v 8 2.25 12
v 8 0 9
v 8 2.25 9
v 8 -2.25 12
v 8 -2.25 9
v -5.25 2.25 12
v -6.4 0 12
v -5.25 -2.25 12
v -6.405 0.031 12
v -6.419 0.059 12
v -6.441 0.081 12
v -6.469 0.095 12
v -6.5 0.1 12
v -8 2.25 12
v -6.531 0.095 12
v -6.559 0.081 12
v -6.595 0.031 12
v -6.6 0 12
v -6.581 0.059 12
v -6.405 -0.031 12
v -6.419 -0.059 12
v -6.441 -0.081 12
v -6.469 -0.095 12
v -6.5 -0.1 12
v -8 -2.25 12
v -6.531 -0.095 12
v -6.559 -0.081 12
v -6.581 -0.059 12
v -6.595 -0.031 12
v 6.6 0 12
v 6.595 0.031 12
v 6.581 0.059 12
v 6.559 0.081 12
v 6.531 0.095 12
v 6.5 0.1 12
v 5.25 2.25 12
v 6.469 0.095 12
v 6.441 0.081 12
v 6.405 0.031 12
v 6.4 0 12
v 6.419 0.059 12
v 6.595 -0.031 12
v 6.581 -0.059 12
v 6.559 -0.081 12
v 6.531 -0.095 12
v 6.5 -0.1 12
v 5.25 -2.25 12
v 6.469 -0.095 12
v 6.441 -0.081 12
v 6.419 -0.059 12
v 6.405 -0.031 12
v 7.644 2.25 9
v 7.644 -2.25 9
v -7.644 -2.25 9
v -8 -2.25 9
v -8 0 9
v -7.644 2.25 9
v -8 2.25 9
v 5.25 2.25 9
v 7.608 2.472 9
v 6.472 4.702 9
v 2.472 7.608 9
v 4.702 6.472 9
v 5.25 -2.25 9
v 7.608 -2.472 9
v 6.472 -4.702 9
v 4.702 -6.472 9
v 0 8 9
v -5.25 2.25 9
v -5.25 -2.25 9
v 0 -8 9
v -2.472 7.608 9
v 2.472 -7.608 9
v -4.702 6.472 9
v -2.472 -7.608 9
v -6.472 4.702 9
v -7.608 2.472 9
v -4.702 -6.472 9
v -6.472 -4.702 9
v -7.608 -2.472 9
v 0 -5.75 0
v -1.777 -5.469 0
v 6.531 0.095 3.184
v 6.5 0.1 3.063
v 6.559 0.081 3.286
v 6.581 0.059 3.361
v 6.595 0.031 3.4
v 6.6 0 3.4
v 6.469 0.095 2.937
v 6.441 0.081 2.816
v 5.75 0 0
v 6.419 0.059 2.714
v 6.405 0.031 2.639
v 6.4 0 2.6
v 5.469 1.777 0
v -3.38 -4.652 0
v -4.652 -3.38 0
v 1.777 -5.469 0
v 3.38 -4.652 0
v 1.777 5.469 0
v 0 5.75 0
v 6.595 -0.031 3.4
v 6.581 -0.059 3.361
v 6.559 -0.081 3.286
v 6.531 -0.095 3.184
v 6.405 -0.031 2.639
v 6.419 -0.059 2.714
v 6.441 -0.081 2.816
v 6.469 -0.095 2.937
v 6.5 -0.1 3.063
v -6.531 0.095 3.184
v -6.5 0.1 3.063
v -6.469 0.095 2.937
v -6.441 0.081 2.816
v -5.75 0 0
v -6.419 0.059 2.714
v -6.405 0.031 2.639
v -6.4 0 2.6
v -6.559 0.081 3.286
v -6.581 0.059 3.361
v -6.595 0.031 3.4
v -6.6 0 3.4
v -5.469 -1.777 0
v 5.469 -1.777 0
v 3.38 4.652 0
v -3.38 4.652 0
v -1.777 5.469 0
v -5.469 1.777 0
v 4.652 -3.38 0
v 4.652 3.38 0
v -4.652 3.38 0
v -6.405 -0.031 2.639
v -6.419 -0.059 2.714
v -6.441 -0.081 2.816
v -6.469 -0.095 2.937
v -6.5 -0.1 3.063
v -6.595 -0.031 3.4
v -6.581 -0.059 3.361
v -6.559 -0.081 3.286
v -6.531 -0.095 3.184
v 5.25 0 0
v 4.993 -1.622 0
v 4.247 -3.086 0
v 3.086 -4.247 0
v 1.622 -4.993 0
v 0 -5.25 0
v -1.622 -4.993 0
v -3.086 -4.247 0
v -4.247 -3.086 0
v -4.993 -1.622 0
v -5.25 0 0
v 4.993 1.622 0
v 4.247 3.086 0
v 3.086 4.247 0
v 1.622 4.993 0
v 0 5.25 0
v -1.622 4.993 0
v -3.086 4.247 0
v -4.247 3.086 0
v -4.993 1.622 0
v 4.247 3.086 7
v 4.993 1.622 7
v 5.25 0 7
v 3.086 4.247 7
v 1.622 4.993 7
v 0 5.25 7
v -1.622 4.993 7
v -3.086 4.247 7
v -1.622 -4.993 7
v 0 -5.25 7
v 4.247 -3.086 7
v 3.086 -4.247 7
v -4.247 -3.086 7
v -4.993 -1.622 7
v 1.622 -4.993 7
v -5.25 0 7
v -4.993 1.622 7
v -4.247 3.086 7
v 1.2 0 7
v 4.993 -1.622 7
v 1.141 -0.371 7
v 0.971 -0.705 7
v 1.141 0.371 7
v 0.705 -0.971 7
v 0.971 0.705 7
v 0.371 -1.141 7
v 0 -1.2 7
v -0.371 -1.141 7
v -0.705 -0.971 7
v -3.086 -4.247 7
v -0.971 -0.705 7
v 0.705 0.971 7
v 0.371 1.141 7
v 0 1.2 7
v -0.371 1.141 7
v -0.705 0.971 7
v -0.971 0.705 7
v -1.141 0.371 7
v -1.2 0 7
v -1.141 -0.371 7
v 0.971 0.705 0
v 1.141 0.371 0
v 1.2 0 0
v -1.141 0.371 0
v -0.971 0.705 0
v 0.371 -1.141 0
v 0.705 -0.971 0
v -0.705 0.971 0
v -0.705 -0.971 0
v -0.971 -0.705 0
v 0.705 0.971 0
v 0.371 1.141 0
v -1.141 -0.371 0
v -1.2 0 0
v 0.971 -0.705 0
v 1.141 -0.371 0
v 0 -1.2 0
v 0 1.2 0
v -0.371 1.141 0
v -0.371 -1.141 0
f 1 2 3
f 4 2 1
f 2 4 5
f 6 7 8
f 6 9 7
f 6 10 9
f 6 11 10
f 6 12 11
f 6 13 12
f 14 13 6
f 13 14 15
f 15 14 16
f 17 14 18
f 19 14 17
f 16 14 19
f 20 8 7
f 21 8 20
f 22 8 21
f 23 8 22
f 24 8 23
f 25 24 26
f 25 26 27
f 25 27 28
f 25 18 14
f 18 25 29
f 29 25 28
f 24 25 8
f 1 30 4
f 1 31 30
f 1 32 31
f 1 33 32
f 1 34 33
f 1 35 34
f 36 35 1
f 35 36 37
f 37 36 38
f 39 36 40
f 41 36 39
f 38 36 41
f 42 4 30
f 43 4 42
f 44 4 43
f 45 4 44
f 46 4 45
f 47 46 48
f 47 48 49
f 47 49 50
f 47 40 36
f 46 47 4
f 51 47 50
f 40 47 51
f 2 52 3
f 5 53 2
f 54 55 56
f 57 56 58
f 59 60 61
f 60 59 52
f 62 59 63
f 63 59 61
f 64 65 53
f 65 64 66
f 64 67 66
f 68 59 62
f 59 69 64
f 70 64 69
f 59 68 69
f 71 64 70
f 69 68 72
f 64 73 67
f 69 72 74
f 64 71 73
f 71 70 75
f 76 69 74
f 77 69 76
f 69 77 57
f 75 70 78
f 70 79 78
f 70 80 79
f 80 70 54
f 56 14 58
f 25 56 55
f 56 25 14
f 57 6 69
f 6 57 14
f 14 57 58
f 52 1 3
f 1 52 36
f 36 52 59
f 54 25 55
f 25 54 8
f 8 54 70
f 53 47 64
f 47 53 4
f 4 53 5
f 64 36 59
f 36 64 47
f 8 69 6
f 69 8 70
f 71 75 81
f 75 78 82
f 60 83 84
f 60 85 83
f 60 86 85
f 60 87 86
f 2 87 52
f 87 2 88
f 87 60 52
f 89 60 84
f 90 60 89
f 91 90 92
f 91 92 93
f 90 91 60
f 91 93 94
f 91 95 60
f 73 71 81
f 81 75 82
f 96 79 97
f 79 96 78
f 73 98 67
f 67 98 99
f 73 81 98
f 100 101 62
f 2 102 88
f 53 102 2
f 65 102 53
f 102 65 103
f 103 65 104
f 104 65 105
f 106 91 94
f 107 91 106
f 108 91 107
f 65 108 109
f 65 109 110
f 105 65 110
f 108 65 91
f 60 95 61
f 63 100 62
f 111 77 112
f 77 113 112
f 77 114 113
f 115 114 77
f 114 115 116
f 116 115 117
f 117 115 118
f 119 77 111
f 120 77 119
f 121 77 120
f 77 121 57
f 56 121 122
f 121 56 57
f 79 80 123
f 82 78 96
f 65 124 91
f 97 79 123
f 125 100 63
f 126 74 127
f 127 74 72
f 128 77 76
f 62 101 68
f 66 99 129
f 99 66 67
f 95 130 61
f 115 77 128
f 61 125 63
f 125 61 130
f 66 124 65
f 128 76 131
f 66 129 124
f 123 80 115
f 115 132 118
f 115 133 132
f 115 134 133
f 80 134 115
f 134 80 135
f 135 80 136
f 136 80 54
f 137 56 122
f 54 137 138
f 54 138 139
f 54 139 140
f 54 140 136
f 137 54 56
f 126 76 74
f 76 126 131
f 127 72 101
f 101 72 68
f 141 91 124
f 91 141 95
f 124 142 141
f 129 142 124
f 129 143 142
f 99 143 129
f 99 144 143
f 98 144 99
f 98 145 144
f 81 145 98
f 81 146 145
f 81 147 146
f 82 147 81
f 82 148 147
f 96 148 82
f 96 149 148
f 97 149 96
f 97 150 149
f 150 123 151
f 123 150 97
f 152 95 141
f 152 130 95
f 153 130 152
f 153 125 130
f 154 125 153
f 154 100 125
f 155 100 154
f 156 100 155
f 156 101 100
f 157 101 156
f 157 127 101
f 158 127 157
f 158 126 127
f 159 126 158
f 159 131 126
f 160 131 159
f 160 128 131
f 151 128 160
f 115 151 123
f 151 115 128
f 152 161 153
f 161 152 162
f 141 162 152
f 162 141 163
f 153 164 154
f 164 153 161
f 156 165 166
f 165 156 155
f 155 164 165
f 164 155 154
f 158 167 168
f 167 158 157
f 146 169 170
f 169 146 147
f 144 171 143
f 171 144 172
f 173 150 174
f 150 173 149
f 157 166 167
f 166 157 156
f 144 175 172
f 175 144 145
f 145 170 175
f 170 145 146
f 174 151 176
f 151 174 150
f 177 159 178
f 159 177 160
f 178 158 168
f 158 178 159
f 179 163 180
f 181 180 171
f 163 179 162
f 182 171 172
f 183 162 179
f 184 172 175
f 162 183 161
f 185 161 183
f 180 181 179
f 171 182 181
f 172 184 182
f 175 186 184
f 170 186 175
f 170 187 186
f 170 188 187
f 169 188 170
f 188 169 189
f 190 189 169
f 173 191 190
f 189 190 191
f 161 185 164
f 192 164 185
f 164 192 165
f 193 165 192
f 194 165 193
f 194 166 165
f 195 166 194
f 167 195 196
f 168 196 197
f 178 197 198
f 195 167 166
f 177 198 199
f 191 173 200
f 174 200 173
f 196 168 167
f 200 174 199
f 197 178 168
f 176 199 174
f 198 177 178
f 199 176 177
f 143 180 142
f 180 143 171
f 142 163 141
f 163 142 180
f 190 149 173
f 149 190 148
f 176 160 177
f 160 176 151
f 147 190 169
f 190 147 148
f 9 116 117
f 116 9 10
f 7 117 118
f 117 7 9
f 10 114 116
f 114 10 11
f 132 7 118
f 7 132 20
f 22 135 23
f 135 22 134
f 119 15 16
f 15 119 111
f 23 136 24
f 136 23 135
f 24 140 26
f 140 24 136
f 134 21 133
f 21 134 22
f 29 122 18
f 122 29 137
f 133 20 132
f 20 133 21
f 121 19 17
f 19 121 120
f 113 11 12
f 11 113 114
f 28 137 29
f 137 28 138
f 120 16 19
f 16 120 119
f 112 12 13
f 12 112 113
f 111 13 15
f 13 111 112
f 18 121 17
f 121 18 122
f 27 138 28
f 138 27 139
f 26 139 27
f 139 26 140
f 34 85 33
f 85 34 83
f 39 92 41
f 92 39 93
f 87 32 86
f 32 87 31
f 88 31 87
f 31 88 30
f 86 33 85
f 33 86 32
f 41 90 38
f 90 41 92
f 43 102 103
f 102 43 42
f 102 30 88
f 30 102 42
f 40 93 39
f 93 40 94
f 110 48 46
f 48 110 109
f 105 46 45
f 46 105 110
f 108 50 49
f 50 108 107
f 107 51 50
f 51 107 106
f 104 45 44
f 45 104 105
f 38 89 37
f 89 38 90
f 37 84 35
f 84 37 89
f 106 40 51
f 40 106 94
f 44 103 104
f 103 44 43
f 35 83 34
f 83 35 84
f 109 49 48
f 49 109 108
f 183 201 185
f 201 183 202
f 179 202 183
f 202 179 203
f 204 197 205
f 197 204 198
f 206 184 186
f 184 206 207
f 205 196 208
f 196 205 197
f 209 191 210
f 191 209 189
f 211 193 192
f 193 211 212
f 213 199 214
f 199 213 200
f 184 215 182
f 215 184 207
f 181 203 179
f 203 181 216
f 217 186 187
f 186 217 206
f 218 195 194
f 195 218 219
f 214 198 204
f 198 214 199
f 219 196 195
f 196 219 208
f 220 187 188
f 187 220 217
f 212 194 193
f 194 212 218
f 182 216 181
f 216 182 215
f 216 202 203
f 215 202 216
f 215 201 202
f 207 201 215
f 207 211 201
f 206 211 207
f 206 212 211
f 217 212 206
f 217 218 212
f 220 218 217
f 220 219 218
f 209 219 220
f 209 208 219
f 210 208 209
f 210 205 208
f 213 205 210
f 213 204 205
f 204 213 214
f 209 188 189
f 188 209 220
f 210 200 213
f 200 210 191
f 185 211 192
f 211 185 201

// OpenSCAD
// file: joystick_4_way_hat_mk1.scad
/*
	OpenJoystick - A project creating affordable, open source, 3D-printable custom flight-sim joysticks for everyone
	Copyright (C) 2012 Travis John Howse

	This program is free software: you can redistribute it and/or modify
	it under the terms of the GNU General Public License as published by
	the Free Software Foundation, either version 3 of the License, or
	(at your option) any later version.

	This program is distributed in the hope that it will be useful,
	but WITHOUT ANY WARRANTY; without even the implied warranty of
	MERCHANTABILITY or FITNESS FOR A PARTICULAR PURPOSE.  See the
	GNU General Public License for more details.

	You should have received a copy of the GNU General Public License
	along with this program.  If not, see <http://www.gnu.org/licenses/>.
*/

include <joystick_defines.scad>

// See joystick_defines for most of the guts.

//translate([0,0,10])
//	4_way_hat_washer();
//translate([0,0,13])
//	switch_hat_saddle();
//  switch_hat_hanoi();
//pb(1);

module hat_base(numDirs)
{
	difference()
	{
		cylinder(r=(4_way_hat_base_dia/2), h=4_way_hat_base_z, $fn=circle_faces);
		
		translate([0,pb_total_z+(4_way_hat_base_screw_dia/2),4_way_hat_base_z-pb_xy/2+zff])
			rotate([90,0,0])
				pb(1.02,0);
		translate([0,-pb_total_z-(4_way_hat_base_screw_dia/2),4_way_hat_base_z-pb_xy/2+zff])
			rotate([-90,180,0])
				pb(1.02,0);
		if (numDirs==4)
		{
			translate([pb_total_z+(4_way_hat_base_screw_dia/2),0,4_way_hat_base_z-pb_xy/2+zff])
				rotate([90,0,-90])
					pb(1.02,0);
			translate([-pb_total_z-(4_way_hat_base_screw_dia/2),0,4_way_hat_base_z-pb_xy/2+zff])
				rotate([-90,180,-90])
					pb(1.02,0);
//			// Now chop the bit out of the middle
			translate([0,0,4_way_hat_base_base_z+zff])
				//cube([4_way_hat_base_screw_dia+2*pb_btn_z+zff,4_way_hat_base_screw_dia+2*pb_btn_z+zff,10],center=true);
                cylinder(r=sqrt(pow((pb_btn_dia/2),2) + pow((4_way_hat_base_screw_dia/2+pb_btn_z),2)),h=10,$fn=circle_faces);
		} else	{
			// Now chop the bit out of the middle
			translate([0,0,4_way_hat_base_base_z+5])
				cube([4_way_hat_base_screw_dia,4_way_hat_base_screw_dia+2*pb_btn_z+zff,10],center=true);
		}

		// Now chop the bit out of the middle
		/*translate([0,0,4_way_hat_base_base_z+5])
			cube([pb_xy+zff,pb_xy+zff,10],center=true);*/

		// Screw
		translate([0,0,-1])
            union()
            {
                rotate([0,5,0]) cylinder(r=4_way_hat_base_screw_dia/2, h=4_way_hat_base_z*1, $fn=circle_faces);
                rotate([0,-5,0]) cylinder(r=4_way_hat_base_screw_dia/2, h=4_way_hat_base_z*1, $fn=circle_faces);
                rotate([5,0,0]) cylinder(r=4_way_hat_base_screw_dia/2, h=4_way_hat_base_z*1, $fn=circle_faces);
                rotate([-5,0,0]) cylinder(r=4_way_hat_base_screw_dia/2, h=4_way_hat_base_z*1, $fn=circle_faces);
                cylinder(r=4_way_hat_base_screw_dia/2, h=4_way_hat_base_z*1, $fn=circle_faces);
            }
	}		
}

module hat_voids(numDirs)
{
	difference()
	{
		cylinder(r=4_way_hat_base_dia/2, h=4_way_hat_base_z);		
		hat_base(numDirs);
	}
}

module switch_hat_saddle()
{
	step_size = 2; // Won't really work for anything other than 2, sorry.
	num_steps = 4_way_hat_base_dia / step_size;
	switch_hat_saddle_base_depth = 4;


	union()
	{
		translate([0,0,switch_hat_saddle_base_depth])
			intersection()
			{
				cylinder(r = (4_way_hat_base_dia/2), h = 10, $fn=circle_faces);
				for (n = [0:num_steps])
				{
					translate([-(4_way_hat_base_dia/2)+n*step_size+0.25*step_size,0,0])
						cube([step_size, 4_way_hat_base_dia, abs((num_steps/2)-n)*1.5],center=true);
				}
			}
		difference()
		{
			cylinder(r = (4_way_hat_base_dia/2), h = switch_hat_saddle_base_depth, $fn=circle_faces);
			translate([0,0,-zff])
				cylinder(r=(4_way_hat_base_screw_dia/2), h =switch_hat_saddle_base_depth, $fn=circle_faces);
		}
	}
}

module switch_hat_hanoi()
{
	
	difference()
	{
		union()
		{
			cylinder(r = (4_way_hat_base_dia/2), h = 2, $fn=circle_faces);
			translate([0,0,2])
			{
				for (n = [1:8])
				{
					cylinder(r = (4_way_hat_base_dia/2 - (n-1)), h = n*0.7, $fn=circle_faces);
				}
			}
		}
		translate([0,0,-zff])
			cylinder(r=(4_way_hat_base_screw_dia/2), h = 4, $fn=circle_faces);
	}	
}

module 4_way_hat_washer()
{
	difference()
	{
		cylinder(r=(4_way_hat_base_dia/2), h = 1, $fn=circle_faces);
		translate([0,0,-zff])
			cylinder(r=(4_way_hat_base_screw_dia/2), h = 1+2*zff, $fn=circle_faces);
	}
}

module hat_stem(height)
{
	bolt(8.5/2, 1.5, 4.5/2, height,0);
}
	
//hat_stem(11); // Face hats
hat_stem(23); // CMS
//switch_hat_hanoi();
// file: joystick_defines.scad
/*
	OpenJoystick - A project creating affordable, open source, 3D-printable custom flight-sim joysticks for everyone
	Copyright (C) 2012 Travis John Howse

	This program is free software: you can redistribute it and/or modify
	it under the terms of the GNU General Public License as published by
	the Free Software Foundation, either version 3 of the License, or
	(at your option) any later version.

	This program is distributed in the hope that it will be useful,
	but WITHOUT ANY WARRANTY; without even the implied warranty of
	MERCHANTABILITY or FITNESS FOR A PARTICULAR PURPOSE.  See the
	GNU General Public License for more details.

	You should have received a copy of the GNU General Public License
	along with this program.  If not, see <http://www.gnu.org/licenses/>.
*/

// Standard skate bearing
bearing_inside_dia = 8;
bearing_outside_dia = 22;
bearing_thickness = 7;

// Arbitrary value
shaft_dia = 16;

zff = 0.005;

extrusion_width = 0.8; // Used for single-wall support.

// Set this to 1 to translate everything to printable mode
printable_mode = 0;

// Gimbal core block sizes 
gimbal_core_x = 50;
gimbal_core_y = 30;
gimbal_core_z = gimbal_core_y;

// Gimbal frame sizes 
gimbal_frame_thickness = 10; 

circle_faces = 20;
$fn=circle_faces;

// The 1.8 is 2sin(45)ish, the maximum y on the xy plane the core can occupy
gimbal_frame_x = gimbal_core_x+2*gimbal_frame_thickness+2; // 2mm for washers
gimbal_frame_y = (gimbal_core_y * 1.8)+gimbal_frame_thickness;

// Frame is big enough to stop the core colliding at 45 degree rotation.
gimbal_frame_z = sqrt(pow(gimbal_core_z,2)/2) * 2 + 2; // 2 fudge to allow for clearance at tips.

max_angle = 45; // Not much comes off this, should probably build it in more places.

module bearing(hole,outer_puff)
{
	difference()
	{
		cylinder(h=bearing_thickness, r = (bearing_outside_dia/2)+outer_puff);

		if (hole)
		{
			translate([0,0,-zff])
				cylinder(h=9, r = (bearing_inside_dia/2));
		}
	}
}

// Hat sizes
// Note that many other settings for the hats are in their own .scad, only stuff relevant to the rest of the stick is here.
pb_xy = 6;
pb_z = 4; // Height minus pushbutton
pb_btn_z = 1;
pb_total_z = pb_z+pb_btn_z;
pb_btn_dia = 3.5;
pb_leg_x = 4;
pb_leg_y = 5;
pb_leg_z = 0.7;

lever_switch_x = 12.85;
lever_switch_y = 6.5;
lever_switch_z = 5.8;

4_way_hat_base_dia = 18;
4_way_hat_base_base_z = 1.5; // Base thickness
4_way_hat_base_z = pb_xy + 4_way_hat_base_base_z;
4_way_hat_base_screw_dia = 5;
4_way_hat_base_screw_head_dia = 8.25;
4_way_hat_base_screw_head_thk = 3;
4_way_hat_wire_gap = 3;
4_way_hat_cutout_z = 4_way_hat_base_z + 4_way_hat_base_screw_head_thk;

// Grip sizes
grip_height = 100;
grip_diameter = 44;
grip_clip = 33;
grip_rest_thickness = 5;
grip_rest_diameter = 80;
grip_cms_height_offset = 50;
grip_cms_offset = -5;
grip_cms_angle = 30;
grip_cms_stub_length = 40;
grip_cms_stub_diameter = 4_way_hat_base_dia;
grip_cms_twist = 15;

grip_head_offset_x = -10;
grip_head_box_x = 4_way_hat_base_dia * 2.5;
grip_head_box_y = 4_way_hat_base_dia * 2.2;
grip_head_box_z = 4_way_hat_base_dia * 2;

joystick_head_trigger_thickness = pb_xy;

my_layer_thickness = 0.35;

joystick_big_btn_height = 8;
joystick_big_btn_diameter = 8.0;
joystick_big_btn_clippyness = 3;

headbolt_x = 10.8;
headbolt_y = -9;
headbolt_z = -11;
headbolt_extra = 8;

module hat_cutout(bloat)
{
	// Very similar to a hat, but it has a cross on the bottom and a peg to indicate where the cables will be run.
	translate([0,0,-4_way_hat_wire_gap-4_way_hat_base_z])
	union()
	{
		translate([0,0,4_way_hat_wire_gap])cylinder(r=(4_way_hat_base_dia/2)*bloat,h=4_way_hat_base_z);
		
		intersection()
		{
			cylinder(r=(4_way_hat_base_dia/2)*bloat,h=4_way_hat_base_z);
			union()
			{
				cube([100, pb_xy, 10],true);
				cube([pb_xy, 100, 10],true);
			}
		}
		translate([0,0,-4_way_hat_base_screw_head_thk+4_way_hat_wire_gap]) cylinder(r=(4_way_hat_base_screw_head_dia/2),h=4_way_hat_base_screw_head_thk,$fn=circle_faces);
	}
}

module pb(puff, legdir)
{
	translate([0,0,pb_z/2])
	{
		// Puff set to 1 if you want a realistic model of a button.
		// Puff variable used for making holes in things bigger than the button size
		cube([pb_xy*puff,pb_xy*puff,pb_z*puff],center=true);
	
		// Button knob itself
		translate([0,0,pb_z/2-zff])
			cylinder(r=(pb_btn_dia/2),h=pb_btn_z,$fn=circle_faces);
	
		// Button legs
		if (legdir == 0)
		{
			translate([0,-pb_xy/2-pb_leg_y/2+zff,-pb_z/2+pb_leg_z/2+0.8])
				cube([pb_xy,pb_leg_y,pb_leg_z],center=true);
		} else {
			translate([0,-pb_xy/2+pb_leg_z/2+zff-pb_leg_z,-pb_z/2-pb_leg_y/2+0.8])
				cube([pb_xy,pb_leg_z,pb_leg_y],center=true);
		}
	}

}

module bolt(cap_r, cap_z, shaft_r, shaft_z,slot_len)
{
	// Hex head bolt for holding head together
	cylinder(r=cap_r,h=cap_z);
	translate([0,0,cap_z]) cylinder(r=shaft_r+0.15, h=slot_len);
	translate([0,0,cap_z+slot_len]) cylinder(r=shaft_r, h=shaft_z-slot_len);
}

module fillet(radius, length)
{
	difference()
	{
		cube([radius,length,radius]);
		translate([radius,length+zff,radius]) rotate([90,0,0]) cylinder(r=radius,h=length+2*zff);
	}
}
// main file
/*
	OpenJoystick - A project creating affordable, open source, 3D-printable custom flight-sim joysticks for everyone
	Copyright (C) 2012 Travis John Howse

	This program is free software: you can redistribute it and/or modify
	it under the terms of the GNU General Public License as published by
	the Free Software Foundation, either version 3 of the License, or
	(at your option) any later version.

	This program is distributed in the hope that it will be useful,
	but WITHOUT ANY WARRANTY; without even the implied warranty of
	MERCHANTABILITY or FITNESS FOR A PARTICULAR PURPOSE.  See the
	GNU General Public License for more details.

	You should have received a copy of the GNU General Public License
	along with this program.  If not, see <http://www.gnu.org/licenses/>.
*/

include <joystick_defines.scad>
use <joystick_handle.scad>
bearing_retain_thickness = 1;

inner_gimbal_x = 58;
inner_gimbal_y = 35;
inner_gimbal_z = 25;

inner_gimbal_total_x = inner_gimbal_x+2*bearing_retain_thickness;
inner_gimbal_total_y = inner_gimbal_y+2*bearing_retain_thickness;

joiner_z = 10;
joiner_x = 10;
joiner_stem_scalar = 4;
support_stem_beef = 1;

temp = joiner_z/2;

springbar_offset = 2;
springbar_y = 20;
springbar_z = 5;
springbar_x = 8;
springbar_separation = springbar_y -8;

// Solidified this variable for consistent springiness
//springsupport_separation = inner_gimbal_total_x-5;
springsupport_separation = 47;
//echo(springsupport_separation);

joiner_peg_z = 5;
joiner_peg_xy = bearing_inside_dia / sqrt(2);

base_support_height = 25;
inner_gimbal_clearance = 2;

magnet_d = 10;
magnet_z = 5;

// A little bit of extra clearance on the springbar to allow for clearance of the bolts internally.
// on the inner gimbal.
// Might abandon this if the bolts/spring cause magnetic annoyances.
springbar_extra = 2;

module joystick_joiner()
{
	total_y = inner_gimbal_y+2*bearing_retain_thickness-2*bearing_thickness;
	bolt_offset = 21.5;
	
	difference()
	{
		union()
		{
			scale([1,1,joiner_stem_scalar]) joystick_handle_peg(0);
			translate([-joiner_x/2,-total_y/2,0]) cube([joiner_x,total_y,joiner_z]);
		}
		//translate([0,total_y/2+zff,joiner_z/2]) rotate([-90,0,0]) %bearing(1);
		//translate([0,-total_y/2-zff-bearing_thickness,joiner_z/2]) rotate([-90,0,0]) %bearing(1);
		
		translate([-joiner_peg_xy/2,total_y/2-joiner_peg_z+zff,joiner_z/2-joiner_peg_xy/2]) cube([joiner_peg_xy,joiner_peg_z,joiner_peg_xy]);
		translate([-joiner_peg_xy/2,-(total_y/2+zff),joiner_z/2-joiner_peg_xy/2]) cube([joiner_peg_xy,joiner_peg_z,joiner_peg_xy]);
		
		//translate([0,-total_y/2-zff-bearing_thickness,joiner_z/2]) rotate([-90,0,0]) #cube([joiner_peg_xy,joiner_peg_z,joiner_peg_xy]);
		
		
		rotate([90,0,0]) translate([0,joiner_z/2,-bolt_offset]) bolt(3,3,1.45,20,0);
		rotate([-90,0,0]) translate([0,-joiner_z/2,-bolt_offset]) bolt(3,3,1.45,20,0);
		
		rotate([-90,0,0]) translate([0,-20,-12]) bolt(3,3,1.45,20,0);
		rotate([-90,0,0]) translate([0,-30,-12]) bolt(3,3,1.45,20,0);
		rotate([-90,0,0]) translate([0,-40,-12]) bolt(3,3,1.45,20,0);
		rotate([-90,0,0]) translate([0,-50,-12]) bolt(3,3,1.45,20,0);
	}
	
}

module joystick_inner_gimbal()
{
	extra_height_on_screwholes = 1;
	difference()
	{
		union()
		{
			difference()
			{
				translate([-inner_gimbal_total_x/2, -inner_gimbal_total_y/2, -inner_gimbal_z/2])
					cube([inner_gimbal_total_x, inner_gimbal_total_y, inner_gimbal_z]);
				translate([-inner_gimbal_x/2+bearing_thickness, -inner_gimbal_y/2+bearing_thickness, -inner_gimbal_z/2-zff])
					cube([inner_gimbal_x-2*bearing_thickness, inner_gimbal_y-2*bearing_thickness, inner_gimbal_z+2*zff]);

				translate([0,inner_gimbal_total_y/2-bearing_thickness+zff,0]) rotate([-90,0,0]) bearing(0,0.1);
				
				translate([0,-inner_gimbal_total_y/2-zff,0]) rotate([-90,0,0]) bearing(0,0.1);
				rotate([90,0,0]) translate([0,0,-inner_gimbal_y/2]) cylinder(r=(bearing_outside_dia-4)/2,h=inner_gimbal_y);
				
				translate([inner_gimbal_total_x/2+zff,0,0]) rotate([0,-90,0]) bearing(0,0.1);
				translate([-inner_gimbal_total_x/2+bearing_thickness-zff,0,0]) rotate([0,-90,0]) bearing(0,0.1);
				rotate([0,90,0]) translate([0,0,-inner_gimbal_x/2]) cylinder(r=(bearing_outside_dia-4)/2,h=inner_gimbal_x);		 
			}
			//cueb!
			
			// Spring support stems
			translate([0,0,springbar_offset]) union()
			{
				translate([springsupport_separation/2-2.5, -inner_gimbal_total_y/2-5, -2.5]) cube([5,springbar_z,5]);
				translate([-springsupport_separation/2-2.5, -inner_gimbal_total_y/2-5, -2.5]) cube([5,springbar_z,5]);
				translate([springsupport_separation/2-2.5, -inner_gimbal_total_y/2-5, -2.5]) rotate([-45,0,0]) cube([5,springbar_z*sqrt(2),5]);
				translate([-springsupport_separation/2-2.5, -inner_gimbal_total_y/2-5, -2.5]) rotate([-45,0,0]) cube([5,springbar_z*sqrt(2),5]);
			
				translate([inner_gimbal_total_x/2, springsupport_separation/2-2.5, -2.5]) cube([springbar_z,5,5+extra_height_on_screwholes]);	
				translate([inner_gimbal_total_x/2, springsupport_separation/2-2.5, -7.5]) rotate([0,-45,0]) cube([springbar_z*sqrt(2),5,5]);
				
				translate([inner_gimbal_total_x/2, -springsupport_separation/2-2.5, -2.5]) cube([springbar_z,5,5+extra_height_on_screwholes]);				
				translate([inner_gimbal_total_x/2, -springsupport_separation/2-2.5, -7.5]) rotate([0,-45,0]) cube([springbar_z*sqrt(2),5,5]);
			}
			translate([inner_gimbal_total_x/2-(inner_gimbal_total_x-springsupport_separation)/2+2.5, -springsupport_separation/2-2.5, -inner_gimbal_z/2])
				cube([(inner_gimbal_total_x-springsupport_separation)/2-2.5,(springsupport_separation-inner_gimbal_total_y)/2+2.5,springbar_offset+inner_gimbal_z/2+2.5+extra_height_on_screwholes]);

			translate([inner_gimbal_total_x/2-(inner_gimbal_total_x-springsupport_separation)/2+2.5, springsupport_separation/2-5, -inner_gimbal_z/2])
				cube([(inner_gimbal_total_x-springsupport_separation)/2-2.5,(springsupport_separation-inner_gimbal_total_y)/2+2.5,springbar_offset+inner_gimbal_z/2+2.5+extra_height_on_screwholes]);

		}
		translate([0,0,springbar_offset]) union()
		{
			translate([springsupport_separation/2, -inner_gimbal_total_y/2-16.5, 0]) rotate([-90,0,0]) bolt(3,3,1.45,20,0);
			translate([-springsupport_separation/2, -inner_gimbal_total_y/2-16.5, 0]) rotate([-90,0,0]) bolt(3,3,1.45,20,0);

		}
		translate([0,0,springbar_offset]) union()
		{
			translate([inner_gimbal_total_x/2+20,springsupport_separation/2, 0]) rotate([0,-90,0]) bolt(3,3,1.45,20,0);
			translate([inner_gimbal_total_x/2+20,-springsupport_separation/2, 0]) rotate([0,-90,0]) bolt(3,3,1.45,20,0);

		}
		// Y-axis centering pegs
		// Note: using the springbar dimensions to ensure the same springiness between X and Y.
		
	}
	//cube([springsupport_separation,100,100],true);
}

module joystick_base()
{
	mounting_extra_y = 20;
	spar_width = joiner_x;
	
	base_x = inner_gimbal_total_x - bearing_thickness*2 - bearing_retain_thickness*2-inner_gimbal_clearance;
	base_y = inner_gimbal_total_y + mounting_extra_y;
	base_z = 5;
	
	fillet_radius = 5;
	
	ttx = spar_width/2-2;

	difference()
	{
		union()
		{
			translate([base_x/2-spar_width,-base_y/2,0]) cube([spar_width,base_y,base_z]);
			translate([-base_x/2,-base_y/2,0]) cube([spar_width,base_y,base_z]);
			
			translate([-(base_x+2*spar_width)/2,-spar_width/2,0]) cube([base_x+2*spar_width,spar_width,base_z]);
			
			translate([-base_x/2,-spar_width/2-support_stem_beef/2,base_z]) 
				difference()
				{
					union()
					{
						cube([spar_width,spar_width+support_stem_beef, base_support_height+support_stem_beef]);
						rotate([0,0,-90]) fillet(fillet_radius,spar_width);
						translate([spar_width,spar_width+support_stem_beef,0]) rotate([0,0,90]) fillet(fillet_radius,spar_width);
						translate([0,spar_width+support_stem_beef/2,0]) rotate([0,0,180]) fillet(fillet_radius,spar_width);
					}
					translate([-zff,spar_width/2-joiner_peg_xy/2+support_stem_beef/2,base_support_height-joiner_peg_xy-(spar_width-joiner_peg_xy)/2]) 
					union()
					{
						cube([joiner_peg_z,joiner_peg_xy, joiner_peg_xy]);
						translate([-spar_width,joiner_peg_xy/2,joiner_peg_xy/2]) rotate([0,90,0]) bolt(3,3,1.45,20,0);
					}
				}
			
			translate([base_x/2-spar_width,-spar_width/2-support_stem_beef/2,base_z])
				difference()
				{
					union()
					{
						cube([spar_width,spar_width+support_stem_beef, base_support_height+support_stem_beef]);
						rotate([0,0,-90]) fillet(fillet_radius,spar_width);
						translate([spar_width,spar_width+support_stem_beef,0]) rotate([0,0,90]) fillet(fillet_radius,spar_width);
						translate([spar_width,support_stem_beef/2,0]) rotate([0,0,0]) fillet(fillet_radius,spar_width);
					}
					translate([spar_width/2+zff,spar_width/2-joiner_peg_xy/2+support_stem_beef/2,base_support_height-joiner_peg_xy-(spar_width-joiner_peg_xy)/2]) 
					union()
					{
						cube([joiner_peg_z,joiner_peg_xy, joiner_peg_xy]);
						translate([spar_width,joiner_peg_xy/2,joiner_peg_xy/2]) rotate([0,-90,0]) bolt(3,3,1.45,20,0);
					}
					
				}
		}
		
		// Mounting bolts
		translate([base_x/2-spar_width/2,-base_y/2+5,10]) rotate([180,0,0]) bolt(3,3,1.45,20,0);
		translate([base_x/2-spar_width/2,base_y/2-5,10]) rotate([180,0,0]) bolt(3,3,1.45,20,0);
		translate([-base_x/2+spar_width/2,-base_y/2+5,10]) rotate([180,0,0]) bolt(3,3,1.45,20,0);
		translate([-base_x/2+spar_width/2,base_y/2-5,10]) rotate([180,0,0]) bolt(3,3,1.45,20,0);
		translate([(base_x+2*spar_width)/2-3,0,10]) rotate([180,0,0]) bolt(3,3,1.45,20,0);
		translate([-(base_x+2*spar_width)/2+3,0,10]) rotate([180,0,0]) bolt(3,3,1.45,20,0);
		
		
		// One day you'll be able to flag primatives for more infill.
		// Until then, horrible hacks:
		translate([spar_width/2+support_stem_beef/2-base_x/2,0,-1]) cylinder(r=0.1,h = 100);
		translate([spar_width/2+support_stem_beef/2-base_x/2+ttx,ttx,-1]) cylinder(r=0.1,h = 100);
		translate([spar_width/2+support_stem_beef/2-base_x/2+ttx,-ttx,-1]) cylinder(r=0.1,h = 100);
		translate([spar_width/2+support_stem_beef/2-base_x/2-ttx,ttx,-1]) cylinder(r=0.1,h = 100);
		translate([spar_width/2+support_stem_beef/2-base_x/2-ttx,-ttx,-1]) cylinder(r=0.1,h = 100);	
		
		translate([-spar_width/2-support_stem_beef/2+base_x/2,0,-1]) cylinder(r=0.1,h = 100);
		translate([-spar_width/2-support_stem_beef/2+base_x/2+ttx,ttx,-1]) cylinder(r=0.1,h = 100);
		translate([-spar_width/2-support_stem_beef/2+base_x/2+ttx,-ttx,-1]) cylinder(r=0.1,h = 100);
		translate([-spar_width/2-support_stem_beef/2+base_x/2-ttx,ttx,-1]) cylinder(r=0.1,h = 100);
		translate([-spar_width/2-support_stem_beef/2+base_x/2-ttx,-ttx,-1]) cylinder(r=0.1,h = 100);
	}
	
}

module joystick_stem_plug(lip_size, extrapeg)
{	
	
	difference()
	{
		union()
		{
			translate([0,0,lip_size]) cylinder(r=bearing_inside_dia/2-0.05,h=bearing_thickness);
			cylinder(r=bearing_inside_dia/2+1,h=lip_size);
			rotate([0,0,90]) translate([-(joiner_peg_xy)/2,-(joiner_peg_xy)/2, bearing_thickness+lip_size]) cube([(joiner_peg_xy),(joiner_peg_xy),joiner_peg_z+extrapeg]);
		}
		translate([0,0,-zff]) bolt(3,3,1.45,20,0);
	}
	//joiner_z
}

module joystick_stem_plug_springbar(extrapeg)
{
	// Keeping this in place for now.
	springbar_offset_old = 0;
	difference()
	{
		union()
		{
			joystick_stem_plug(springbar_z,extrapeg);
			translate([0,0,springbar_z/2]) cube([springbar_offset_old,springbar_y/2,springbar_z],true);	
			translate([springbar_offset_old,0,springbar_z/2]) cube([springbar_x,springbar_y,springbar_z],true);	
		}
		translate([0,0,-zff]) bolt(3,3,1.45,20,0);
		translate([springbar_offset_old,-springbar_y/2+4,-10]) bolt(3,3,1.45,20,0);
		translate([springbar_offset_old,springbar_y/2-4,-10]) bolt(3,3,1.45,20,0);
	}
}

module joystick_y_padding_washer()
{
	washer_dia = 12;
	
	difference()
	{
		cylinder(r=washer_dia/2, h=bearing_retain_thickness+inner_gimbal_clearance/2);
		cube([joiner_peg_xy+0.5,joiner_peg_xy+0.5,100],true);
	}
}

module temp_stem_extender()
{
	difference()
	{
		scale([1,1,(1/1.4)*0.7]) joystick_handle_peg(0);
		translate([0,0,7-magnet_z+zff]) cylinder(r=magnet_d/2+0.2, h=magnet_z);
	}
}

module joystick_magnet_holder(magnet_d, magnet_z)
{
	// This widget holds the magnet at the bottom of the stem.
	
	holder_z = magnet_z+2;
	peg_z = holder_z+2;
	
	peg_x = 4;
	peg_y = 4.5;
	support_width = 11;
	
	extrusion_width=0.5;

	difference()
	{
		union()
		{
			cylinder(h = holder_z, r2 = (shaft_dia/2), r1=(magnet_d/2)+0.5);
			difference()
			{
				translate([0,0,holder_z+1.5]) cube([shaft_dia,peg_y,3],true);
				cube([joiner_x*1.05,100,100],true);
			}
			//translate([(shaft_dia/2)-peg_x,-peg_y/2,0]) cube([peg_x-0.5,peg_y,peg_z]);
			//translate([(-shaft_dia/2),-peg_y/2,0]) cube([peg_x-0.5,peg_y,peg_z]);
		}
		cylinder(r=magnet_d/2,magnet_z);
		
		translate([-(shaft_dia/2)+1.5,0,0]) cylinder(r=0.1,h = 100);
		translate([(shaft_dia/2)-1.5,0,0]) cylinder(r=0.1,h = 100);
	}
	//rotate([0,0,90]) translate([-extrusion_width/2,-support_width/2,0]) cube([extrusion_width,support_width,magnet_z]);
	cylinder(r=1.2,h=magnet_z);
	//%cube([7.3,7.3,100],true);
}

module gimbal_alignment_jig()
{
	jig_x = ((inner_gimbal_x-2*bearing_thickness)/2-(bearing_retain_thickness+inner_gimbal_clearance/2)-(joiner_x-support_stem_beef))*2;
	jig_y = 20;
	jig_z = 6;
	//cylinder(r=(inner_gimbal_x-2*bearing_thickness)/2-(bearing_retain_thickness+inner_gimbal_clearance/2)-(joiner_x-support_stem_beef),h=30);
	difference()
	{
		translate([0,0,jig_z/2]) cube([jig_x,jig_y,jig_z],true);
		cylinder(r=shaft_dia/2+0.2,h=jig_z);
		translate([0,0,jig_z/4]) cube([joiner_x+0.2,jig_y,jig_z/2],true);
	}
}

//translate([0,inner_gimbal_y/2+4+bearing_retain_thickness,0]) rotate([90,0,0]) rotate([0,0,90]) joystick_stem_plug(4,0);
//rotate([0,0,180]) translate([0,inner_gimbal_y/2+springbar_z+bearing_retain_thickness,0]) rotate([90,0,0]) rotate([0,0,-90]) joystick_stem_plug_springbar(inner_gimbal_clearance);
//translate([30,0,0]) joystick_stem_plug_springbar(inner_gimbal_clearance);
//translate([13,0,0]) joystick_stem_plug(2,inner_gimbal_clearance);

//temp_stem_extender();
//joystick_joiner();
//joystick_y_padding_washer();
/*
test_x = 0;
test_y = 20;
translate([0,0,inner_gimbal_z/2+base_support_height-12]) rotate([test_x,0,0]) rotate([0,test_y,0]) translate([0,0,-5])  union()
{
	joystick_joiner();
	translate([0,0,-9]) joystick_magnet_holder(10.5,7);
}
translate([springbar_z+inner_gimbal_total_x/2,0,inner_gimbal_z/2+base_support_height-12.5]) rotate([0,-90,0]) union()
{
	joystick_stem_plug_springbar(inner_gimbal_clearance);
	translate([0,0,joiner_peg_z+bearing_thickness]) joystick_y_padding_washer();
}
translate([0,0,inner_gimbal_z/2+base_support_height-12]) rotate([test_x,0,0]) joystick_inner_gimbal();
joystick_base();
translate([0,0,inner_gimbal_z/2+base_support_height-10]) gimbal_alignment_jig();
*/
joystick_magnet_holder(10.5,7);

//translate([0,50,0]) joystick_base();


//translate([0,0,inner_gimbal_z/2]) joystick_inner_gimbal();
